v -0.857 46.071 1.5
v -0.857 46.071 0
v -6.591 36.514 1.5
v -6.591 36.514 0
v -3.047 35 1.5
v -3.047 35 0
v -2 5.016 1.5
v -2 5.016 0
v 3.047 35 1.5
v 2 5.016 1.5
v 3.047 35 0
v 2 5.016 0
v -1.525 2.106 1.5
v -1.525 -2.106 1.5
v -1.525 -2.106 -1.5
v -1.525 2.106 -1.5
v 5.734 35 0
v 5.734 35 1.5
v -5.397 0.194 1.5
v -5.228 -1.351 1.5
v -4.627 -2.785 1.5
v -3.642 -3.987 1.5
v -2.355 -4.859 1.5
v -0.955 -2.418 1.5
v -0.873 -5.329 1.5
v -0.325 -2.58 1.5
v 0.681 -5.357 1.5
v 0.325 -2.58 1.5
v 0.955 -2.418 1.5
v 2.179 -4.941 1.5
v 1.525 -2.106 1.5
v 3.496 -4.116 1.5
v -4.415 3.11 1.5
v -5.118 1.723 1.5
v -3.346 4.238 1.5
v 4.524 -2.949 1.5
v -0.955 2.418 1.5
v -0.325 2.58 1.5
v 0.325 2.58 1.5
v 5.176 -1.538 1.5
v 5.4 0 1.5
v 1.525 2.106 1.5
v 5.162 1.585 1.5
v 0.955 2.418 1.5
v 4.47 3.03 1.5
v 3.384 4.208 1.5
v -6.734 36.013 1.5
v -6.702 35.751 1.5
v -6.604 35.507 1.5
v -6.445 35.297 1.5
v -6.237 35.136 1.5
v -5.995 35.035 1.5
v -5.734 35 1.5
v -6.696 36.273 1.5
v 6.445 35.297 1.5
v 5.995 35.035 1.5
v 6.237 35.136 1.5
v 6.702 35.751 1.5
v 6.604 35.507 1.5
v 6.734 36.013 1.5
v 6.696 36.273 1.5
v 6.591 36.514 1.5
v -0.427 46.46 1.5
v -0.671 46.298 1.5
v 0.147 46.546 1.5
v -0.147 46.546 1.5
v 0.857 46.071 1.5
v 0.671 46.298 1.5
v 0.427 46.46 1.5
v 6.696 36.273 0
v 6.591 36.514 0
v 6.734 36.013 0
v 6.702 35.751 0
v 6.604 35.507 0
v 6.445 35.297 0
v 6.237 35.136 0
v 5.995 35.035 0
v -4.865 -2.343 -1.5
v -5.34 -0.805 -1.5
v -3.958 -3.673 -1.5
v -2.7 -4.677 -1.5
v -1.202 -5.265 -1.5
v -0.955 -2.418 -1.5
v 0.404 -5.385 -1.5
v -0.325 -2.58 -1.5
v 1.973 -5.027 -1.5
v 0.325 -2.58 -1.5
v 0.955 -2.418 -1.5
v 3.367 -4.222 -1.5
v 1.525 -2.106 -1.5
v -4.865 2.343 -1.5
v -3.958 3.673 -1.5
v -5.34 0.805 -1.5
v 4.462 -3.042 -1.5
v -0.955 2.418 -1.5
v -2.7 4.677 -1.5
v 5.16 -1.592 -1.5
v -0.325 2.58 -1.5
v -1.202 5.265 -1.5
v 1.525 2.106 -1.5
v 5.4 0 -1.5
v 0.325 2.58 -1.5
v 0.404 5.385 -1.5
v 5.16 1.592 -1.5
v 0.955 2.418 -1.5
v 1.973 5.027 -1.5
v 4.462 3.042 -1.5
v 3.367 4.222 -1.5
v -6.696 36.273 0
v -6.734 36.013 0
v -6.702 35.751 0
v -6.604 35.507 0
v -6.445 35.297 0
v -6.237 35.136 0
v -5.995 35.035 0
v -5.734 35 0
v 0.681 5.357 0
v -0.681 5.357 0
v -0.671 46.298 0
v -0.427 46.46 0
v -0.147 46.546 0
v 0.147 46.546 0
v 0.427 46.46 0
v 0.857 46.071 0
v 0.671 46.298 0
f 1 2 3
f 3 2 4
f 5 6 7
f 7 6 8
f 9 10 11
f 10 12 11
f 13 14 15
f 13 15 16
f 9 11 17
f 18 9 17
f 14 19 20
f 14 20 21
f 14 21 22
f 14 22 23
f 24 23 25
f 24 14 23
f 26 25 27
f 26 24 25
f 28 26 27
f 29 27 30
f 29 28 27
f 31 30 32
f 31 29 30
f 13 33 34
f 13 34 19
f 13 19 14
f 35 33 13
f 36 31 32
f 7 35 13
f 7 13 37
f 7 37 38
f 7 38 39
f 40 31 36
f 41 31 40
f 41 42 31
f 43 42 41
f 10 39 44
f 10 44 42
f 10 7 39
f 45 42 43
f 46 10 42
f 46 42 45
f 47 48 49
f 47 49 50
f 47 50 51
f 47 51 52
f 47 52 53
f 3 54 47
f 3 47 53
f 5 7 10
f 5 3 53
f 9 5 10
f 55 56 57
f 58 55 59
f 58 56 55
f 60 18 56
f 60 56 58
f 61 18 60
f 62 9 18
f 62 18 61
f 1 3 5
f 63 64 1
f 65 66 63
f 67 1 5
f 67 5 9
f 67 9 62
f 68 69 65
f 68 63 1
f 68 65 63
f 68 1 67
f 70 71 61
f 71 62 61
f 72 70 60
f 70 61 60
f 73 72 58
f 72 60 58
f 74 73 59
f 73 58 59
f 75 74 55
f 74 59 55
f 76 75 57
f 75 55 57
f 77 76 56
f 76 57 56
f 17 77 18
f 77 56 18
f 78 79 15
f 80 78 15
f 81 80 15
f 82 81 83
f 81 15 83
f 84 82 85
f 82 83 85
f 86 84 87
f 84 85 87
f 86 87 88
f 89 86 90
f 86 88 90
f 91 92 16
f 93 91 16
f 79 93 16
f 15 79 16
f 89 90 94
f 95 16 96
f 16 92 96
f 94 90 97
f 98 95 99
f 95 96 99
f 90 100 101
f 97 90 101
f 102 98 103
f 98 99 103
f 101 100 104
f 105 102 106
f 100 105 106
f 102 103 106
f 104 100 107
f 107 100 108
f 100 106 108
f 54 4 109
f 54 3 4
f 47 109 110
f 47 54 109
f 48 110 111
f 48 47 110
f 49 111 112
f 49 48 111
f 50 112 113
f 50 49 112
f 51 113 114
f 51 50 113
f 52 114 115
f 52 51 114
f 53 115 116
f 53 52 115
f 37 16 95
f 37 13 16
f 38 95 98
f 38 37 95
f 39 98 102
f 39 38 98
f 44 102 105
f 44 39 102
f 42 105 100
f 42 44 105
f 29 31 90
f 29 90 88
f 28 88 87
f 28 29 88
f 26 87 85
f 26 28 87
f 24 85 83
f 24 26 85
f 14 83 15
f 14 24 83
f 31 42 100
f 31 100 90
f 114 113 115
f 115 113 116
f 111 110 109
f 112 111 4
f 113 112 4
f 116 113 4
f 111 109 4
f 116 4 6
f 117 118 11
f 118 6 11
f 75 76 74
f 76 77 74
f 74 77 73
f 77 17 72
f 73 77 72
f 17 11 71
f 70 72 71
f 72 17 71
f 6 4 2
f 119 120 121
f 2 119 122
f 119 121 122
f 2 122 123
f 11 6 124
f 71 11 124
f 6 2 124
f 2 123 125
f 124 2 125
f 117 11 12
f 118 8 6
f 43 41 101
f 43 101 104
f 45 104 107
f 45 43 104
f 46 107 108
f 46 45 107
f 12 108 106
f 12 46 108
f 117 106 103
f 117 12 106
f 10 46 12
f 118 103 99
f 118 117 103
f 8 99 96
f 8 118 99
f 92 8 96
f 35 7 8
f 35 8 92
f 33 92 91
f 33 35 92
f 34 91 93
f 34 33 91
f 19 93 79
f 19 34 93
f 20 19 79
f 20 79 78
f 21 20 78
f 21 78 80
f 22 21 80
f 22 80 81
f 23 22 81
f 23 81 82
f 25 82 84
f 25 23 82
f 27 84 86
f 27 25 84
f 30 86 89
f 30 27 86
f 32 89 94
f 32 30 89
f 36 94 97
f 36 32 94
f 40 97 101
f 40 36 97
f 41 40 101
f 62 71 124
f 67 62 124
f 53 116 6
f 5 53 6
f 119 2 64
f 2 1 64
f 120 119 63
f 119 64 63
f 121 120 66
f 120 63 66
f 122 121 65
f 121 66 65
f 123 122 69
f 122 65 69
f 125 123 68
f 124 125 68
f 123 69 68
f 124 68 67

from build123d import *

# Parameters (mm, degrees)
F0_R     = 5.4
F1_DEPTH = 1.5
F3_DEPTH = 1.5
F6_DEPTH = 1.5
F7_R     = 1


with BuildPart() as f1:
    # F0 (on Top) → F1 (new body, symmetric)
    with BuildSketch(Plane.XY):
        Circle(F0_R)
        with BuildLine():
            ThreePointArc((1.525, 2.105796), (2.315707, 1.182159), (2.6, 0))
            ThreePointArc((2.6, 0), (2.315707, -1.182159), (1.525, -2.105796))
            ThreePointArc((1.525, -2.105796), (0, -2.6), (-1.525, -2.105796))
            ThreePointArc((-1.525, -2.105796), (-2.6, 0), (-1.525, 2.105796))
            ThreePointArc((-1.525, 2.105796), (0, 2.6), (1.525, 2.105796))
        make_face(mode=Mode.SUBTRACT)
        with BuildLine():
            Line((-1.525, -2.105796), (-1.525, 2.105796))
            ThreePointArc((-1.525, 2.105796), (-2.6, 0), (-1.525, -2.105796))
        make_face()
        with BuildLine():
            ThreePointArc((1.525, -2.105796), (2.315707, -1.182159), (2.6, 0))
            ThreePointArc((2.6, 0), (2.315707, 1.182159), (1.525, 2.105796))
            Line((1.525, 2.105796), (1.525, -2.105796))
        make_face()
    extrude(amount=F1_DEPTH, both=True)

    # F2 (on Top) → F3 (join, through all)
    with BuildSketch(Plane.XY):
        Polygon((-2, 5.015974), (0, 5.015974), (2, 5.015974), (3.047065, 35), (0, 35), (-3.047065, 35), align=None)
    extrude(amount=F3_DEPTH)

    # F5 (on Top) → F6 (join, through all)
    with BuildSketch(Plane.XY):
        Polygon((0, 47.5), (-7.5, 35), (7.5, 35), align=None)
    extrude(amount=F6_DEPTH)

    # F7
    f7_edges = [f1.edges().sort_by_distance(p)[0] for p in [
        (0, 47.5, 0.75),
        (-7.5, 35, 0.75),
        (7.5, 35, 0.75),
    ]]
    fillet(f7_edges, radius=F7_R)


solid = f1.part
